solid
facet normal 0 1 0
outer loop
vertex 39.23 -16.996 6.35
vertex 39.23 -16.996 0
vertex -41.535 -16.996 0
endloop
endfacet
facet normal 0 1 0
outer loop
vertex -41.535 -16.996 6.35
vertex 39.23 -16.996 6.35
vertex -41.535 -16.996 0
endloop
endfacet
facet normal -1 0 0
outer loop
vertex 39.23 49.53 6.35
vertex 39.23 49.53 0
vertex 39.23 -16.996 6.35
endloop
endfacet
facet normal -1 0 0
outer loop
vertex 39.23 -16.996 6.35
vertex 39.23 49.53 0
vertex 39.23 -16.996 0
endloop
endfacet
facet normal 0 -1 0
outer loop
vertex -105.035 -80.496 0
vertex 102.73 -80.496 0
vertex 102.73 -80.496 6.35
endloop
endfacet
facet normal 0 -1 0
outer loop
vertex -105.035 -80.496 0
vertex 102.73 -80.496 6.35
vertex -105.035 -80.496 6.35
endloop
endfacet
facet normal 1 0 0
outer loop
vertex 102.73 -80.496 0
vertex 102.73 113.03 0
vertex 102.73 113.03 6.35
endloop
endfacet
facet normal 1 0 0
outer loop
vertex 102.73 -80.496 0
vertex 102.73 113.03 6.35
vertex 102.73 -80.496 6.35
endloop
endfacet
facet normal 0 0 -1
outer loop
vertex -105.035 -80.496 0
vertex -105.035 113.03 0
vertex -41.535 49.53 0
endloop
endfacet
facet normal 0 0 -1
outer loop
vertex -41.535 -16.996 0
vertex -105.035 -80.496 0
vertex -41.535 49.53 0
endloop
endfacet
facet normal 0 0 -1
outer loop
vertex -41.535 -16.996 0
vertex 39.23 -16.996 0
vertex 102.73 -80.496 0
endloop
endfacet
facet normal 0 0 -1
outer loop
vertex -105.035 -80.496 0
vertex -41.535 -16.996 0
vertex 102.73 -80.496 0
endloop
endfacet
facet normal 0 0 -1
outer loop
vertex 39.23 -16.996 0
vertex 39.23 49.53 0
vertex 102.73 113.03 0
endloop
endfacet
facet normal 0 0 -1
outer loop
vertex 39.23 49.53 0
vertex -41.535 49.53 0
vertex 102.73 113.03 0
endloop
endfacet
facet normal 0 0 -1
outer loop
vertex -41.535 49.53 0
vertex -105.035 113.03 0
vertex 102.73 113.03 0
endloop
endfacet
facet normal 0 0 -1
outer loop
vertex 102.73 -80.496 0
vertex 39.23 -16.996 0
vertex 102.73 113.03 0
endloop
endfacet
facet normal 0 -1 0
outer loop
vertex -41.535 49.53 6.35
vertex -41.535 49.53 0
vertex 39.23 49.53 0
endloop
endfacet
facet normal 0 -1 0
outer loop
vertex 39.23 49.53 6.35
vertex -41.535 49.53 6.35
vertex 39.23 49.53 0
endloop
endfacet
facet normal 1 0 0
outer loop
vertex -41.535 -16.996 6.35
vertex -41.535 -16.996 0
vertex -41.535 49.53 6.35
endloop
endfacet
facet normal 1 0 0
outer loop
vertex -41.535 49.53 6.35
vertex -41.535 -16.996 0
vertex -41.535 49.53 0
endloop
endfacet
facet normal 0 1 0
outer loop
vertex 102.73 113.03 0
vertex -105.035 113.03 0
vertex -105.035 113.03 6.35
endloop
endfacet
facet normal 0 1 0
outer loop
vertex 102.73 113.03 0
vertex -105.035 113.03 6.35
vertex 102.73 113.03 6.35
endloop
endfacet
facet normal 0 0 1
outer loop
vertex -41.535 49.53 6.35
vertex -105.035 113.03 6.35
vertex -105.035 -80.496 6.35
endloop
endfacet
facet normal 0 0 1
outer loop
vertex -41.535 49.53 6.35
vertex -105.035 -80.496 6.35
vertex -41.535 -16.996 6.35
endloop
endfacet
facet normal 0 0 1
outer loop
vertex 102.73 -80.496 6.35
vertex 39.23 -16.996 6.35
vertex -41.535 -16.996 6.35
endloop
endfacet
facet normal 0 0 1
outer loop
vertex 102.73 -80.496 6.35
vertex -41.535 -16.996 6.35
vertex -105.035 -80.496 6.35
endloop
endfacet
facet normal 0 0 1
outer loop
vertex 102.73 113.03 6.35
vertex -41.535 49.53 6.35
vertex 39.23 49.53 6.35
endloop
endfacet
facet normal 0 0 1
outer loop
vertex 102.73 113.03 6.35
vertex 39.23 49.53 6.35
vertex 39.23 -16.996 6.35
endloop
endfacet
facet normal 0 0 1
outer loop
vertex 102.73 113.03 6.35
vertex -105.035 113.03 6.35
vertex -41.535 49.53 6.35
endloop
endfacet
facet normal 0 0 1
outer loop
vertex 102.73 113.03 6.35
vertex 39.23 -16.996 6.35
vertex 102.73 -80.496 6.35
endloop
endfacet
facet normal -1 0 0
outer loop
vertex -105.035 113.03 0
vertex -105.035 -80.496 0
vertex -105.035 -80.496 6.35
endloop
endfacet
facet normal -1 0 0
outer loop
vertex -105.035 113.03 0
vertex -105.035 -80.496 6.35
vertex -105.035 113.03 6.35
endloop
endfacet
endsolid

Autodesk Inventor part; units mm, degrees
ref_plane "YZ Plane" through (0, 0, 0) normal (1, 0, 0) x (0, 1, 0)
ref_plane "XZ Plane" through (0, 0, 0) normal (0, 1, 0) x (-1, 0, 0)
ref_plane "XY Plane" through (0, 0, 0) normal (0, 0, 1) x (1, 0, 0)
sketch "Sketch1" plane through (0, 0, 0) normal (0, 0, 1) x (1, 0, 0)
  line L0 (-14.8528, 1.9795) -> (12.8586, 1.9795) construction
  line L1 (12.8586, 1.9795) -> (12.8586, -13.7685) construction
  line L2 (12.8586, -13.7685) -> (-14.8528, -13.7685) construction
  line L3 (-14.8528, -13.7685) -> (-14.8528, 1.9795) construction
  line L4 (5.9975, 1.9795) -> (8.6518, 1.9795) construction
  line L5 (8.6518, 1.9795) -> (8.6518, 4.3671) construction
  line L6 (8.6518, 4.3671) -> (5.9975, 4.3671) construction
  line L7 (5.9975, 4.3671) -> (5.9975, 1.9795) construction
  line L8 (-32.4421, 11.5045) -> (30.2817, 11.5045) construction
  line L9 (-32.4421, 8.3295) -> (29.9988, 8.3295) construction
  line L10 (-13.9321, 13.8921) -> (17.834, 13.8921) construction
  line L11 (-1.8734, -10.8674) -> (-1.8734, -21.0274) construction
  line L12 (-2.2544, -23.9285) -> (-2.2544, -13.7685) construction
  line L13 (-14.8528, -9.4505) -> (-21.958, -9.4505) construction
  line L14 (-21.958, -9.8315) -> (-14.0038, -9.8315) construction
  line L15 (-14.8528, 1.9795) -> (12.6787, 5.1322) construction
  arc A0 (9.1943, 9.241) -> (-14.8528, 1.9795) centre (-1.1526, 0.0577) ccw construction
  circle A1 centre (-10.8004, 5.3198) radius 0.889 construction
  line L16 (-13.0354, 11.5045) -> (-13.0354, 8.3295) construction
  line L17 (10.7302, 11.5045) -> (10.7302, 8.3295) construction
  line L18 (-12.2416, 8.3295) -> (-12.2416, 11.5045) construction
  line L19 (9.9365, 8.3295) -> (9.9365, 11.5045) construction
  line L20 (13.1115, 8.3295) -> (11.9301, 8.1942) construction
  line L21 (11.9301, 8.1942) -> (12.3229, 8.2392) construction
  line L22 (13.377, 6.0111) -> (13.2018, 7.5409) construction
  line L23 (-13.2979, 6.6819) -> (-11.5809, 5.7454) construction
  line L24 (-10.4753, 2.4807) -> (-10.6993, 4.4365) construction
  arc A2 (9.1943, 9.241) -> (11.9301, 8.1942) centre (11.5689, 11.3486) ccw construction
  arc A3 (13.2018, 7.5409) -> (12.3229, 8.2392) centre (12.4132, 7.4506) ccw construction
  arc A4 (12.6787, 5.1322) -> (13.377, 6.0111) centre (12.5884, 5.9208) ccw construction
  circle A5 centre (-11.9953, -0.878) radius 1.5875 construction
  line L25 (-13.5828, 0.7095) -> (-5.6621, 0.7095) construction
  line L26 (-13.5828, -2.3385) -> (-13.5828, 0.7095) construction
  circle A6 centre (10.0011, -10.911) radius 1.5875 construction
  line L27 (11.5886, -9.3235) -> (11.5886, -12.4985) construction
  line L28 (11.5886, -12.4985) -> (4.7585, -12.4985) construction
  line L29 (-13.0354, 11.5045) -> (10.7302, 11.5045) construction
  line L30 (10.7302, 11.5045) -> (10.7302, 21.0295) construction
  line L31 (10.7302, 21.0295) -> (-13.0354, 21.0295) construction
  line L32 (-13.0354, 21.0295) -> (-13.0354, 11.5045) construction
  circle A7 centre (9.2302, 19.5295) radius 1.5 construction
  circle A8 centre (9.2302, 19.5295) radius 30 construction
  circle A9 centre (-11.5354, 13.0045) radius 1.5 construction
  circle A10 centre (-11.5354, 13.0045) radius 30 construction
  line L33 (-41.5354, 49.5295) -> (39.2302, 49.5295)
  line L34 (39.2302, 49.5295) -> (39.2302, -16.9955)
  line L35 (39.2302, -16.9955) -> (-41.5354, -16.9955)
  line L36 (-41.5354, -16.9955) -> (-41.5354, 49.5295)
  line L37 (-105.0354, 113.0295) -> (102.7302, 113.0295)
  line L38 (102.7302, 113.0295) -> (102.7302, -80.4955)
  line L39 (102.7302, -80.4955) -> (-105.0354, -80.4955)
  line L40 (-105.0354, -80.4955) -> (-105.0354, 113.0295)
  point P0 (0, 0)
  dimension "d0" = 27.7114
  dimension "d1" = 15.748
  dimension "d2" = 2.6543
  dimension "buttonHeight" = 2.3876
  dimension "d4" = 3.175
  dimension "d5" = 2.3876
  dimension "buttonInset" = 4.2068
  dimension "d10" = 14.732
  dimension "d11" = 0.381
  dimension "d12" = 10.16
  dimension "d14" = 11.43
  dimension "d15" = 0.381
  dimension "d16" = 6.35
  dimension "nail" = 1.778
  dimension "clearance" = 0.7937
  dimension "d32" = 0.7937
  dimension "cutOutLength" = 23.7656
  dimension "d34" = 2.3813
  dimension "d35" = 1.9558
  dimension "d36" = 1.9558
  dimension "d37" = 3.175
  dimension "d38" = 0.7937
  dimension "holeDistanceFromSurface" = 3.0097
  dimension "holeDistanceFromEnd" = 4.0524
  dimension "d52" = 3.175
  dimension "d53" = 1.27
  dimension "d54" = 1.27
  dimension "d55" = 3.175
  dimension "d56" = 1.27
  dimension "d57" = 1.27
  dimension "d60" = 9.525
  dimension "d69" = 3
  dimension "d70" = 60
  dimension "d71" = 3
  dimension "d72" = 60
  dimension "d75" = 63.5
  dimension "margin" = 63.5
  dimension "d77" = 63.5
  dimension "d78" = 63.5
extrude "Extrusion9" add sketch "Sketch1" along normal blind 6.35
equation "\"d5\" = buttonHeight"
equation "\"d32\" = clearance"
properties part number "Surface Switch Cutout Jig"
